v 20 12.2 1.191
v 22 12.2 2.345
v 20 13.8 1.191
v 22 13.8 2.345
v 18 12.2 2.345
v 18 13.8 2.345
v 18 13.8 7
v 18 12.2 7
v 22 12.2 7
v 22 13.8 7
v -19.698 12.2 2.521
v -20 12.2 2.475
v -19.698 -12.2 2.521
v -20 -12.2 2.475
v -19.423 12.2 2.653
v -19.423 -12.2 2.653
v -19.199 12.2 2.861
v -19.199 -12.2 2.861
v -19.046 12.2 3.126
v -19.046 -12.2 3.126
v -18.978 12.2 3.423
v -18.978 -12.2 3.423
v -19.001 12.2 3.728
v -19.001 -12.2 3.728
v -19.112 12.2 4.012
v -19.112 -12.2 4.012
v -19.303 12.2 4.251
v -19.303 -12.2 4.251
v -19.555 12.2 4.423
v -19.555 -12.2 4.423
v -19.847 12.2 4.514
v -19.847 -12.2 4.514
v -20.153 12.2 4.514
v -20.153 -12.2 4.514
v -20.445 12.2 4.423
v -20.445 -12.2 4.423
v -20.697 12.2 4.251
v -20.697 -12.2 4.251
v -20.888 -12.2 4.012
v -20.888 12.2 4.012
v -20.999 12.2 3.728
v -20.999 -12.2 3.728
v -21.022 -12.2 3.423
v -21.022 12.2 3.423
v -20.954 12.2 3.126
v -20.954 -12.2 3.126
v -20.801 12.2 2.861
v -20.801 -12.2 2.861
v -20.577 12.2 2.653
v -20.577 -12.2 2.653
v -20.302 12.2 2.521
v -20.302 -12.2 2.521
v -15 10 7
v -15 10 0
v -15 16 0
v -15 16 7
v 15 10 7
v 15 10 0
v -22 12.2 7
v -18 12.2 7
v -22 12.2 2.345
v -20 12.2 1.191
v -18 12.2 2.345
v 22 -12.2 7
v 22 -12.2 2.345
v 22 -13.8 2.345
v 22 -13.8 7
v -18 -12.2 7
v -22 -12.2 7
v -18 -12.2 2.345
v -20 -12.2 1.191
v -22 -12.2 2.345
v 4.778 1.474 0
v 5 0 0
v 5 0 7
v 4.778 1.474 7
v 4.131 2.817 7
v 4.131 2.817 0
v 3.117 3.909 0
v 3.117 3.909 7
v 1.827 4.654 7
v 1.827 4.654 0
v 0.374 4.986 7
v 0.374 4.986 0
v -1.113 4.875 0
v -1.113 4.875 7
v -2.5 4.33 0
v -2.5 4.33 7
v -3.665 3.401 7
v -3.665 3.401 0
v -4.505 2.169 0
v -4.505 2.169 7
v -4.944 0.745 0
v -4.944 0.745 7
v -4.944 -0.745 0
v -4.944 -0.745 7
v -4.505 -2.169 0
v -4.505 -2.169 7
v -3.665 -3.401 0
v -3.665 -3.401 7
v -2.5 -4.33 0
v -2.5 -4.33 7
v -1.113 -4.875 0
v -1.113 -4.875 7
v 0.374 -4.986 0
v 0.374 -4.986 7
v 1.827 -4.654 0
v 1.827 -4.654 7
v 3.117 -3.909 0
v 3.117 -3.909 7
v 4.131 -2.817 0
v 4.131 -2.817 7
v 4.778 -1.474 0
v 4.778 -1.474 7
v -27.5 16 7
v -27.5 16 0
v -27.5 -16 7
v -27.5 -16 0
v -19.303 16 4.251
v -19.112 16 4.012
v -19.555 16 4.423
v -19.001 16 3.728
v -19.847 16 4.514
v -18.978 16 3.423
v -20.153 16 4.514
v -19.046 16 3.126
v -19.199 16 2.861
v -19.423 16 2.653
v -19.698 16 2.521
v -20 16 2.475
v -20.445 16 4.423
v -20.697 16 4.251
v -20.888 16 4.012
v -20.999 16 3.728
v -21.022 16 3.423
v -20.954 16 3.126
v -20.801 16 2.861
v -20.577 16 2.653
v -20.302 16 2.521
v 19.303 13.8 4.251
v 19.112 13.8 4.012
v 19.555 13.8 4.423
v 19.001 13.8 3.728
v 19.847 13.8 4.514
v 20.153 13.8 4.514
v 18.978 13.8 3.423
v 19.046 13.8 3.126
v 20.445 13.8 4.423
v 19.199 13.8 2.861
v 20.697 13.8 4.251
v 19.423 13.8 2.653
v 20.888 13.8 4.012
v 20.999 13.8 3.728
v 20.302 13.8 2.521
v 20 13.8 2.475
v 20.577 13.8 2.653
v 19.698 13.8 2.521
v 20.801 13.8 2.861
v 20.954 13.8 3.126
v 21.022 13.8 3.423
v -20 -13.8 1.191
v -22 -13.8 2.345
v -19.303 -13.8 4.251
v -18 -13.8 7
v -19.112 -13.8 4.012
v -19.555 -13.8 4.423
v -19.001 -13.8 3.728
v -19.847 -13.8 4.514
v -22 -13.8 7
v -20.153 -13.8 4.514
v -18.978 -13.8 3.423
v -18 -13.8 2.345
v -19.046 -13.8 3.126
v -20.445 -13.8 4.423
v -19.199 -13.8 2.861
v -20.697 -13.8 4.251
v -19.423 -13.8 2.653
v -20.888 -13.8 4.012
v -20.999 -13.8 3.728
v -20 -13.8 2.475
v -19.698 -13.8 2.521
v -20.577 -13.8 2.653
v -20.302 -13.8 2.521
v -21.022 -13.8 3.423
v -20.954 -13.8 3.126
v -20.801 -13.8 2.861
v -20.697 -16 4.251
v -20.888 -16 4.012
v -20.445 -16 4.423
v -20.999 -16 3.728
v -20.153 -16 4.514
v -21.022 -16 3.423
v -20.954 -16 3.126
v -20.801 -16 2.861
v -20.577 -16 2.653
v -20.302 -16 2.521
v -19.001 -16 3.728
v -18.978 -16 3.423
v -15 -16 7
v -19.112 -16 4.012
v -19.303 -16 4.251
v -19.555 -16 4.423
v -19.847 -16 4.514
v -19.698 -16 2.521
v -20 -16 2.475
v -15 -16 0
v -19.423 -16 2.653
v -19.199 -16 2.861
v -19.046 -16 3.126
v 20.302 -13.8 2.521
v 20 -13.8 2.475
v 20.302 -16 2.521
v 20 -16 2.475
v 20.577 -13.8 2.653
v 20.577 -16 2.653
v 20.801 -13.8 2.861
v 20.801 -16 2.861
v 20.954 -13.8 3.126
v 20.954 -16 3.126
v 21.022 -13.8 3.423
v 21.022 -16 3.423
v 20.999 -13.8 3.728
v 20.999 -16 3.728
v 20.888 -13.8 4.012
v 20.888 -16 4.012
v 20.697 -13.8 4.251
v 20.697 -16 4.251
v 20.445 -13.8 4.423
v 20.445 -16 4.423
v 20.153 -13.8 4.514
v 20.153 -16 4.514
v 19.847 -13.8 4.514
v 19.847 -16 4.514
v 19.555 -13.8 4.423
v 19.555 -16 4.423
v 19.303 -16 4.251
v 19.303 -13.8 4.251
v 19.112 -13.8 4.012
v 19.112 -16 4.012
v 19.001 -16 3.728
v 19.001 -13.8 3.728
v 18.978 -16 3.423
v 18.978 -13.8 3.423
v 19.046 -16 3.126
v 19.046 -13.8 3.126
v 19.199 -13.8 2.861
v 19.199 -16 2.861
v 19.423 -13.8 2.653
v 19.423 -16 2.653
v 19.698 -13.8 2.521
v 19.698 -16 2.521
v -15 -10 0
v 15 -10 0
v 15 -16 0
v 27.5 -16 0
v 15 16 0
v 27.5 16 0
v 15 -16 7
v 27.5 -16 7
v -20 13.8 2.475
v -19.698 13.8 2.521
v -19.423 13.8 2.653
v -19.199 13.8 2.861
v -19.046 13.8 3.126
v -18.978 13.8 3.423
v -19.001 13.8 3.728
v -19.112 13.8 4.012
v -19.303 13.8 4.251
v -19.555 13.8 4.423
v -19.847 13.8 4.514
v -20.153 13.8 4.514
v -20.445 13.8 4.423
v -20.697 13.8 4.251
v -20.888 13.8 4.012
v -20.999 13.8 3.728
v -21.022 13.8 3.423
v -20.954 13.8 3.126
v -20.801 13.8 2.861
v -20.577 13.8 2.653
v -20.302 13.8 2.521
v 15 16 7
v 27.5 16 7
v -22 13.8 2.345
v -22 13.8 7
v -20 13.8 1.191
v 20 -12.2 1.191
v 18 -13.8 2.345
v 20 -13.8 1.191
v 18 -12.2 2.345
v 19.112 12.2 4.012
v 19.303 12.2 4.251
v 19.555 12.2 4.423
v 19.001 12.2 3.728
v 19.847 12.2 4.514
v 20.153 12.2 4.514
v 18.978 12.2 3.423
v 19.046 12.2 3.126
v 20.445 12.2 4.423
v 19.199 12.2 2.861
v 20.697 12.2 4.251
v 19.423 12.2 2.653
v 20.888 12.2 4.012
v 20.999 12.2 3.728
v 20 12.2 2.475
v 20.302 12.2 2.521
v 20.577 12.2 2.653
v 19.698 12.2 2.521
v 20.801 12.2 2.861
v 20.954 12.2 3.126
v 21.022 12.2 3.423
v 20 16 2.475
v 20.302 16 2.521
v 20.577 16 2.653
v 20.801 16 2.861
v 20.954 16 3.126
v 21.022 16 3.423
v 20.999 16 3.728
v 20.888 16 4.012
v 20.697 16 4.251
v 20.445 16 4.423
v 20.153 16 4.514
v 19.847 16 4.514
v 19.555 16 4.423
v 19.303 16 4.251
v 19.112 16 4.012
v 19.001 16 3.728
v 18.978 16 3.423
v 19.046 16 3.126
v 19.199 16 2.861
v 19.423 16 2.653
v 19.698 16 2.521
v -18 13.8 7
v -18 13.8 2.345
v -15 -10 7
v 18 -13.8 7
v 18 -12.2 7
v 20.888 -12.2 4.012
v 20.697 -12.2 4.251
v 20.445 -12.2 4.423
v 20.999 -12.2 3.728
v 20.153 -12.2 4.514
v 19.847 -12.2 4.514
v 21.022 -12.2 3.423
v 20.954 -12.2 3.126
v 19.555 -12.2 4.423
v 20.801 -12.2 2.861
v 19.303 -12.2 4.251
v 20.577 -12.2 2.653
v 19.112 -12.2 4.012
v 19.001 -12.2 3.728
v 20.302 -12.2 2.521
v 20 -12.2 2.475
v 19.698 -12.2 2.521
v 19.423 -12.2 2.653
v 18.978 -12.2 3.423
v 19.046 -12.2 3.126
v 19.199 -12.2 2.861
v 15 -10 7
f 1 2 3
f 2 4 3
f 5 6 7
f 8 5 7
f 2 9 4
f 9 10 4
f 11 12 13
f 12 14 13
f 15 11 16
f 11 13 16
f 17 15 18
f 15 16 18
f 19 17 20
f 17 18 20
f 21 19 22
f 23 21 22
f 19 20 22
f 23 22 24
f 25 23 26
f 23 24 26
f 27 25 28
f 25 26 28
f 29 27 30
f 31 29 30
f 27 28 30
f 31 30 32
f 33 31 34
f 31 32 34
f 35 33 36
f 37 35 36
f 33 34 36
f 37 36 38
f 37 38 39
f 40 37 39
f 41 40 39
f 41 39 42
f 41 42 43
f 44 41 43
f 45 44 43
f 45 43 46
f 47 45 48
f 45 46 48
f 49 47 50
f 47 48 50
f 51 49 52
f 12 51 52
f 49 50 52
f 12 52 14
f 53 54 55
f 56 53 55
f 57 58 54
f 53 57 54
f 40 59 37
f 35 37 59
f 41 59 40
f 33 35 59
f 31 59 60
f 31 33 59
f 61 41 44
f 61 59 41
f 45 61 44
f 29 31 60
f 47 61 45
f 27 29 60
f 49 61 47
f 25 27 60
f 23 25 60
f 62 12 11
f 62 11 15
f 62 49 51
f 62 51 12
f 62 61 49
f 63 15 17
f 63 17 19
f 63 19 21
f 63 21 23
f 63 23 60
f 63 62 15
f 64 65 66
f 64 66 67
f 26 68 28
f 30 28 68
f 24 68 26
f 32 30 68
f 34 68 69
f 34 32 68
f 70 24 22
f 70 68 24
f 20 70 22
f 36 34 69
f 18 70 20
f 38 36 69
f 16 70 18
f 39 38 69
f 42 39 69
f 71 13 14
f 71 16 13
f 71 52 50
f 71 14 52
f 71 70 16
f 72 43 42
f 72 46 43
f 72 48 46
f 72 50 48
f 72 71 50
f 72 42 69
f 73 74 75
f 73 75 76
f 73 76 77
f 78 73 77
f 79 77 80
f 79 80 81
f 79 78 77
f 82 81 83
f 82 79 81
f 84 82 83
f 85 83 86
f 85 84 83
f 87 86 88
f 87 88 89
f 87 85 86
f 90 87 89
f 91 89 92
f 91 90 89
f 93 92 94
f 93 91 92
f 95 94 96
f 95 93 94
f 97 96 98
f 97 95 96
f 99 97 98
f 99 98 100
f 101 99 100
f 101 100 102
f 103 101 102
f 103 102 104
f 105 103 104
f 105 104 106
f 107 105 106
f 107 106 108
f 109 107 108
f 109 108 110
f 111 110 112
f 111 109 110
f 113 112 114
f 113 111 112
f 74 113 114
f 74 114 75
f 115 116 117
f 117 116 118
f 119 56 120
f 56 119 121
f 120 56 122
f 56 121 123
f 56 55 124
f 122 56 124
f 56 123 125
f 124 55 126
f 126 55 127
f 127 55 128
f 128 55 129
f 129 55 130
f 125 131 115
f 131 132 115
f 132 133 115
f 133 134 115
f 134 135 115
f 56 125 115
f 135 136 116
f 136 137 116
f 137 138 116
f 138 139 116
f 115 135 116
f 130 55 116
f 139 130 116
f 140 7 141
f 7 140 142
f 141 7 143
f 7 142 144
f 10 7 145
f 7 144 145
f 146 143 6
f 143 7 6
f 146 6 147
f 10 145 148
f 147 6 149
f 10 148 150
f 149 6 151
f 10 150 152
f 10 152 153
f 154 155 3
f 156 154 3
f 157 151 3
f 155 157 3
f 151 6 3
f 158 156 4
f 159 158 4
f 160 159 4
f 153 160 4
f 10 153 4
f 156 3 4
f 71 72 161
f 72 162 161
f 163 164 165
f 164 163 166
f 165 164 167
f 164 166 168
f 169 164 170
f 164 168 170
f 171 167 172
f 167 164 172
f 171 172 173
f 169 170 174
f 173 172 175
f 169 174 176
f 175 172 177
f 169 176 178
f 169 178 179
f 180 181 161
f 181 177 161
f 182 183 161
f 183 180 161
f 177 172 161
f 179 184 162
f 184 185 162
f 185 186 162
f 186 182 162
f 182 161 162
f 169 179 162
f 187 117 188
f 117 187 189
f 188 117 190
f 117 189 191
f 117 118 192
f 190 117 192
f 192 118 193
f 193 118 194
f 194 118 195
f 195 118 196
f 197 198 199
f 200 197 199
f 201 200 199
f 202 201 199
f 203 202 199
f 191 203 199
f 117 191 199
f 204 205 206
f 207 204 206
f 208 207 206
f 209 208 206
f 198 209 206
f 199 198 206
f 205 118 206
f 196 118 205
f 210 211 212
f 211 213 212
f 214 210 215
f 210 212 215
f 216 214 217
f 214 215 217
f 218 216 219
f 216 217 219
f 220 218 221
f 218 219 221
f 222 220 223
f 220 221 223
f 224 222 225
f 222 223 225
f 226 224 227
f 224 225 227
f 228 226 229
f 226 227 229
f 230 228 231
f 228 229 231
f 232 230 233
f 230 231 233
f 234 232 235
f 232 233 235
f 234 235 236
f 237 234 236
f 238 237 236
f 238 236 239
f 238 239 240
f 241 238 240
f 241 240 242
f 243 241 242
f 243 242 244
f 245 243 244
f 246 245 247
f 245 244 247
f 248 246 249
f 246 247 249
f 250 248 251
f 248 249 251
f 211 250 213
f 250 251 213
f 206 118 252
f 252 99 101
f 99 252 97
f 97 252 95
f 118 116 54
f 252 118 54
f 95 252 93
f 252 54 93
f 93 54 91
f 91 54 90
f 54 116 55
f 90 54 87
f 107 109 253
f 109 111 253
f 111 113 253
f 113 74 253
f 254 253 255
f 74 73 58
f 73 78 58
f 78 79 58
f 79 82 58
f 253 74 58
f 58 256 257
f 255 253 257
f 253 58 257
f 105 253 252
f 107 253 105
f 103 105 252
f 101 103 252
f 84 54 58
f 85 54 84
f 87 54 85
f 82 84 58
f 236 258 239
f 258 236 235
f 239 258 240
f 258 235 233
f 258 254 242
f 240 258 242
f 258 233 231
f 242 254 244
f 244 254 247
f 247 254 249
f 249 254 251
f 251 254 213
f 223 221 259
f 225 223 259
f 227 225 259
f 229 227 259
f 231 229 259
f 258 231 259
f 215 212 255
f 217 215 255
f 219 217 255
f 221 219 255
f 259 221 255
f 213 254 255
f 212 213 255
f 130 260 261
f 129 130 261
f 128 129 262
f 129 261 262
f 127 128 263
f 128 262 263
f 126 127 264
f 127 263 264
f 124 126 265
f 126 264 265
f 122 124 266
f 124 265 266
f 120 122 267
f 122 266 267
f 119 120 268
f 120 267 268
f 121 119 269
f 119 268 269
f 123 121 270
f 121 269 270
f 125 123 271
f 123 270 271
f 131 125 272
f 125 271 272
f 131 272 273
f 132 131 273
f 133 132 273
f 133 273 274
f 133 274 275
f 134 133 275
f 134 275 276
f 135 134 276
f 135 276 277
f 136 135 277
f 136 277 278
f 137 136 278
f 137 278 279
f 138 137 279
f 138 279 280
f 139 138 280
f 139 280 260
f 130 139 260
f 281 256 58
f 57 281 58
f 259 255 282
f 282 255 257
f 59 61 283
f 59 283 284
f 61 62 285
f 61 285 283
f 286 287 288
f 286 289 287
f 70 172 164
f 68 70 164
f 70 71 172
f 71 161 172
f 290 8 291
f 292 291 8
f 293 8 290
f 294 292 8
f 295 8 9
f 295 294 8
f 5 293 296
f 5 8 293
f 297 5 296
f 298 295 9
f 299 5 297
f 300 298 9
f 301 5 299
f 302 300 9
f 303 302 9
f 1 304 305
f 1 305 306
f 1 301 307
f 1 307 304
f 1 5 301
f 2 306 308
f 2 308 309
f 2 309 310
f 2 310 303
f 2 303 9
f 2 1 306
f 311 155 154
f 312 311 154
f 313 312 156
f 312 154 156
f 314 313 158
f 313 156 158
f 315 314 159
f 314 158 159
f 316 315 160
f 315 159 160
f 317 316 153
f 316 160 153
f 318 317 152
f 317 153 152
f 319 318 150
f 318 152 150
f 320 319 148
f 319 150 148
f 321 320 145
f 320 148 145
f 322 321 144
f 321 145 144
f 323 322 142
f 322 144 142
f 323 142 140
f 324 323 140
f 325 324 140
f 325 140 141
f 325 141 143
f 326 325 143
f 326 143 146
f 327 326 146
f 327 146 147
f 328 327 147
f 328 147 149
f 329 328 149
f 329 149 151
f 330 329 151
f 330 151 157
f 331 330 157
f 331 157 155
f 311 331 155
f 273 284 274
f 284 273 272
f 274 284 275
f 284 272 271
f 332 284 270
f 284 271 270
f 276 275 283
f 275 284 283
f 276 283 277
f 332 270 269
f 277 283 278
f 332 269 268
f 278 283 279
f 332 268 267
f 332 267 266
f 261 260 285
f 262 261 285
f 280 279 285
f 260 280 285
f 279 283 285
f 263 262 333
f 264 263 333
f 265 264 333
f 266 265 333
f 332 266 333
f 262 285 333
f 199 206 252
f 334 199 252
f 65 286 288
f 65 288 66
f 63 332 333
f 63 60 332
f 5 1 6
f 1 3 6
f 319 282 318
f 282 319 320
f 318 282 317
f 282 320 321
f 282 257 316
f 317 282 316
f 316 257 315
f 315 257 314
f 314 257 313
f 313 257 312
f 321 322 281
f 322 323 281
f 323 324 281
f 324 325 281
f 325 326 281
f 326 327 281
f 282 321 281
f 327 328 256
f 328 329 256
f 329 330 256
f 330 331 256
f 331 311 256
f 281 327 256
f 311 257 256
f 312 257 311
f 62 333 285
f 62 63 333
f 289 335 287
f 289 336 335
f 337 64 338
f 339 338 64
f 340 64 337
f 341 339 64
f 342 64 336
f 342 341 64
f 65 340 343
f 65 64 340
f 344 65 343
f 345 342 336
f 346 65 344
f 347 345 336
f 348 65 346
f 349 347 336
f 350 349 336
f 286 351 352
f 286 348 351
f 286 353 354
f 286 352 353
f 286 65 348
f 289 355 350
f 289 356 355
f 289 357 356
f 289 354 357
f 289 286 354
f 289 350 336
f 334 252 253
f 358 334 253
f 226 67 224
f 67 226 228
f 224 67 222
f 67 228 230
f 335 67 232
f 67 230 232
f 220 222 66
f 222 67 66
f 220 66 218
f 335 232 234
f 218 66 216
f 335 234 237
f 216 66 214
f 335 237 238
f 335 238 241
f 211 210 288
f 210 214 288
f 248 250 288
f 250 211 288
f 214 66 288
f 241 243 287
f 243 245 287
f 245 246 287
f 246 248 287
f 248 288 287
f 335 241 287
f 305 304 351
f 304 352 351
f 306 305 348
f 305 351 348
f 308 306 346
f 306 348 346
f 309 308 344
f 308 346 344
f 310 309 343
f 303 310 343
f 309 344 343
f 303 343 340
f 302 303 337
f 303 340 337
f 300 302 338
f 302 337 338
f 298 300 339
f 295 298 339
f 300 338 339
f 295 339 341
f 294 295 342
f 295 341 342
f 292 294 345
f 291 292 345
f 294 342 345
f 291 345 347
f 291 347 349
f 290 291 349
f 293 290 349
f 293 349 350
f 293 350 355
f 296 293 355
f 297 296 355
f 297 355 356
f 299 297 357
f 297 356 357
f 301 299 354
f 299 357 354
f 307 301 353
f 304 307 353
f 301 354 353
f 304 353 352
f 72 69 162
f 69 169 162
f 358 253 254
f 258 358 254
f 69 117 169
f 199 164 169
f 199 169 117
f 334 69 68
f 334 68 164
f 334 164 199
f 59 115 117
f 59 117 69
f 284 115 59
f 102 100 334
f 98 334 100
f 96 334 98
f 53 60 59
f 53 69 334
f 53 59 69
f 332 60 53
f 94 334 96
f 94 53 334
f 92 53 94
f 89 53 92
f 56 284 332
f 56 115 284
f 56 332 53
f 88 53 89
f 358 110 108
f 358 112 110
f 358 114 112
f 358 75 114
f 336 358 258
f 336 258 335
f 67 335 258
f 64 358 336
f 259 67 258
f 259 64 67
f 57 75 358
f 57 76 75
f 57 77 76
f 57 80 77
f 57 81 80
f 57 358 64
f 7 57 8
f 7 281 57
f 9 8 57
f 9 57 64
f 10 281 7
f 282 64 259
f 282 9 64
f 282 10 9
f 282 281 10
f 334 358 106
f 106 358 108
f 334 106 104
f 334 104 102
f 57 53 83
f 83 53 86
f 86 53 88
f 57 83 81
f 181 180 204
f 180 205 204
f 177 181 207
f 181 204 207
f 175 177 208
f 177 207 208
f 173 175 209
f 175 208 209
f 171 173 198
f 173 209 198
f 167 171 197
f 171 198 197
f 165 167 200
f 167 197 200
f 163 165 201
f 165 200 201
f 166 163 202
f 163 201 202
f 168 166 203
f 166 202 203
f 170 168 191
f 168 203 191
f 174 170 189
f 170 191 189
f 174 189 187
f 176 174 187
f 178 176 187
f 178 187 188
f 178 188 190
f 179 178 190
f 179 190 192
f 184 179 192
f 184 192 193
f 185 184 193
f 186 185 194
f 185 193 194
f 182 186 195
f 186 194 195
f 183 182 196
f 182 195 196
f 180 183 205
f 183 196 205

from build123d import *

# Parameters (mm, degrees)
SKETCH_1_R          = 5
EXTRUDE_1_DEPTH     = 7
M2_5X0_45_1_D       = 2.05
CUT_EXTRUDE_1_DEPTH = 0.8
CUT_EXTRUDE_3_DEPTH = 0.8


with BuildPart() as part:
    # 草图1 → 凸台-拉伸1 (new body)
    with BuildSketch(Plane.XY):
        Polygon((-15, 10), (-15, 16), (-27.5, 16), (-27.5, -16), (-15, -16), (-15, -10), (15, -10), (15, -16), (27.5, -16), (27.5, 16), (15, 16), (15, 10), align=None)
        Circle(SKETCH_1_R, mode=Mode.SUBTRACT)
    extrude(amount=EXTRUDE_1_DEPTH)

    # M2.5x0.45 螺纹孔1 (through all)
    with Locations(Plane(origin=(-20, 16, 3.5), x_dir=(0, 0, 1), z_dir=(0, 1, 0))):
        with Locations((0, 0), (0, 40)):
            Hole(M2_5X0_45_1_D / 2)

    # 草图4 → 切除-拉伸1 (cut, symmetric)
    with BuildSketch(Plane(origin=(0, 13, 0), x_dir=(1, 0, 0), z_dir=(0, 1, 0))):
        Polygon((-22, -4.654700538), (-22, -7), (-18, -7), (-18, -4.654700538), (-18, -2.345299462), (-20, -1.190598923), (-22, -2.345299462), align=None)
        Polygon((20, -1.190598923), (18, -2.345299462), (18, -4.654700538), (18, -7), (22, -7), (22, -4.654700538), (22, -2.345299462), align=None)
    extrude(amount=CUT_EXTRUDE_1_DEPTH, both=True, mode=Mode.SUBTRACT)

    # 草图7 → 切除-拉伸3 (cut, symmetric)
    with BuildSketch(Plane(origin=(0, -13, 0), x_dir=(-1, 0, 0), z_dir=(0, -1, 0))):
        Polygon((-22, -4.654700538), (-22, -7), (-18, -7), (-18, -4.654700538), (-18, -2.345299462), (-20, -1.190598923), (-22, -2.345299462), align=None)
        Polygon((20, -1.190598923), (18, -2.345299462), (18, -4.654700538), (18, -7), (22, -7), (22, -4.654700538), (22, -2.345299462), align=None)
    extrude(amount=CUT_EXTRUDE_3_DEPTH, both=True, mode=Mode.SUBTRACT)


solid = part.part
